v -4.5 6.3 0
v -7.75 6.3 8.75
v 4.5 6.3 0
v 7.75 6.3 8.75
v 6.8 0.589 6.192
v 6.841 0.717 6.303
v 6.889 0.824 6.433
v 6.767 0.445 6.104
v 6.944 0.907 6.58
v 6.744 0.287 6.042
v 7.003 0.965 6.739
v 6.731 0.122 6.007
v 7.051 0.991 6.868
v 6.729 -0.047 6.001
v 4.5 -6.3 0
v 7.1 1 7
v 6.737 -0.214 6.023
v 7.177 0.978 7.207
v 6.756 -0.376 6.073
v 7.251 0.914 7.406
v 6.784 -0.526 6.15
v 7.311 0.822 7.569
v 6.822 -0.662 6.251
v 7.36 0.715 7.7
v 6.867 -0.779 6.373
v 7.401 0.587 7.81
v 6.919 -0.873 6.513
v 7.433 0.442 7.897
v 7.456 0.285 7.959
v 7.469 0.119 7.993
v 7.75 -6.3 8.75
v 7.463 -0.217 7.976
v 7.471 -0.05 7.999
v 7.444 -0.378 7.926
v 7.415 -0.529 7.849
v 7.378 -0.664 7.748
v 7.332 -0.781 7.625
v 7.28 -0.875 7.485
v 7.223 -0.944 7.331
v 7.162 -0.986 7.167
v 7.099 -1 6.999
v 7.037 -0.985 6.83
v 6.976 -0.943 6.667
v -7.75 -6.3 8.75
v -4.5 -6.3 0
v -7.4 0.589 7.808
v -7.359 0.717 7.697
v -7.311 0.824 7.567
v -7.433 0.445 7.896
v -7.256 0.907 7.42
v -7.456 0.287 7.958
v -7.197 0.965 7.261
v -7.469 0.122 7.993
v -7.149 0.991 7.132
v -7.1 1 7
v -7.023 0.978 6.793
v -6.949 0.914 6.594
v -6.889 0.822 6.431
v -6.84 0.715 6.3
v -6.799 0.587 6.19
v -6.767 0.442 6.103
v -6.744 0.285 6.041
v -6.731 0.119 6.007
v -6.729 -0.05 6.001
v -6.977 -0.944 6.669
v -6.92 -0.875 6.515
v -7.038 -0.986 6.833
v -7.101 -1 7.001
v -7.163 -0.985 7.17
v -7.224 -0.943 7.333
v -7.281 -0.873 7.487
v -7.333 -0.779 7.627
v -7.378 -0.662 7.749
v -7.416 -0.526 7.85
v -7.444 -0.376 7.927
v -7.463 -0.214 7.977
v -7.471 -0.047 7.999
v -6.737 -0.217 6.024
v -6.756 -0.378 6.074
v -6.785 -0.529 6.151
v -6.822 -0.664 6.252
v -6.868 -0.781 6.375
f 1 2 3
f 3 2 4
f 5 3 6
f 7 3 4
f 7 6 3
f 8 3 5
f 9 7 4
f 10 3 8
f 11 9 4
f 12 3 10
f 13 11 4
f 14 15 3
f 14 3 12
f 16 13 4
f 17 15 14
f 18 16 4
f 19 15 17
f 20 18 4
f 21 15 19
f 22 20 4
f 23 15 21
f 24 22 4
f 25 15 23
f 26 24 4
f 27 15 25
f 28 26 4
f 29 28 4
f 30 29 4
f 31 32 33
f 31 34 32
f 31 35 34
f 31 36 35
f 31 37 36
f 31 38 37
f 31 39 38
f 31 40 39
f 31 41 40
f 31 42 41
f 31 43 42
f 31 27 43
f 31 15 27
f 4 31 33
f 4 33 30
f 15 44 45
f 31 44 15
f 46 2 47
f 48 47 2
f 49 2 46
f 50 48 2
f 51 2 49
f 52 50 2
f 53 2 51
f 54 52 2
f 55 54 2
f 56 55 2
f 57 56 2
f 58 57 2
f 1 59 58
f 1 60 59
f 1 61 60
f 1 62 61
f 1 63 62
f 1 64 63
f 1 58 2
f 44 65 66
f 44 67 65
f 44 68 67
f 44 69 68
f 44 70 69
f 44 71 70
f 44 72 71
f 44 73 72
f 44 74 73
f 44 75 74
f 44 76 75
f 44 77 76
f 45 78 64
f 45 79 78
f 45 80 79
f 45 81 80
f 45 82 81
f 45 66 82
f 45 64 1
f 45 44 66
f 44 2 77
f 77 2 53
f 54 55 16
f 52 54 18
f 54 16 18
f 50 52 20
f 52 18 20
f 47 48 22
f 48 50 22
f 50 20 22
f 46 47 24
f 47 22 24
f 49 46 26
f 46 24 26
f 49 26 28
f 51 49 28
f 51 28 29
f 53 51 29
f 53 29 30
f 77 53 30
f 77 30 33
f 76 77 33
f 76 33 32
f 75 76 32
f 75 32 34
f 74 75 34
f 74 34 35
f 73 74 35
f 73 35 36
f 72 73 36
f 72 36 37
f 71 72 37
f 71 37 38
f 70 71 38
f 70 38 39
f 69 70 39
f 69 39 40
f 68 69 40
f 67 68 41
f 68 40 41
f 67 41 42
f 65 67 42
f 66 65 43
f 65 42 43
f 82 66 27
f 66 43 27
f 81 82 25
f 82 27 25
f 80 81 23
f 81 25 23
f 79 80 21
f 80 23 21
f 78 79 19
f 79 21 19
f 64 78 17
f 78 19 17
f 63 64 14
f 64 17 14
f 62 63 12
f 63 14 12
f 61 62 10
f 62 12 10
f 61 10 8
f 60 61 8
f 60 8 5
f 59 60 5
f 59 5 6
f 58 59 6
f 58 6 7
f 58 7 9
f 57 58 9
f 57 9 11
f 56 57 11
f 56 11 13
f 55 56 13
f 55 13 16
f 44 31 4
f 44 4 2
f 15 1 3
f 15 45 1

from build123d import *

# Parameters (mm, degrees)
F3_DEPTH = 6.3
F2_R     = 1
F4_DEPTH = 15.501


with BuildPart() as f3:
    # F0 (on Front) → F3 (new body, symmetric)
    with BuildSketch(Plane.XZ):
        Polygon((-4.5, 0), (0, 0), (4.5, 0), (7.75, 8.75), (0, 8.75), (-7.75, 8.75), align=None)
    extrude(amount=F3_DEPTH, both=True)

    # F2 (on plane+point) → F4 (cut, through all)
    with BuildSketch(Plane.YZ.offset(7.75)):
        with Locations((0, 7)):
            Circle(F2_R)
    extrude(amount=-F4_DEPTH, mode=Mode.SUBTRACT)


solid = f3.part
